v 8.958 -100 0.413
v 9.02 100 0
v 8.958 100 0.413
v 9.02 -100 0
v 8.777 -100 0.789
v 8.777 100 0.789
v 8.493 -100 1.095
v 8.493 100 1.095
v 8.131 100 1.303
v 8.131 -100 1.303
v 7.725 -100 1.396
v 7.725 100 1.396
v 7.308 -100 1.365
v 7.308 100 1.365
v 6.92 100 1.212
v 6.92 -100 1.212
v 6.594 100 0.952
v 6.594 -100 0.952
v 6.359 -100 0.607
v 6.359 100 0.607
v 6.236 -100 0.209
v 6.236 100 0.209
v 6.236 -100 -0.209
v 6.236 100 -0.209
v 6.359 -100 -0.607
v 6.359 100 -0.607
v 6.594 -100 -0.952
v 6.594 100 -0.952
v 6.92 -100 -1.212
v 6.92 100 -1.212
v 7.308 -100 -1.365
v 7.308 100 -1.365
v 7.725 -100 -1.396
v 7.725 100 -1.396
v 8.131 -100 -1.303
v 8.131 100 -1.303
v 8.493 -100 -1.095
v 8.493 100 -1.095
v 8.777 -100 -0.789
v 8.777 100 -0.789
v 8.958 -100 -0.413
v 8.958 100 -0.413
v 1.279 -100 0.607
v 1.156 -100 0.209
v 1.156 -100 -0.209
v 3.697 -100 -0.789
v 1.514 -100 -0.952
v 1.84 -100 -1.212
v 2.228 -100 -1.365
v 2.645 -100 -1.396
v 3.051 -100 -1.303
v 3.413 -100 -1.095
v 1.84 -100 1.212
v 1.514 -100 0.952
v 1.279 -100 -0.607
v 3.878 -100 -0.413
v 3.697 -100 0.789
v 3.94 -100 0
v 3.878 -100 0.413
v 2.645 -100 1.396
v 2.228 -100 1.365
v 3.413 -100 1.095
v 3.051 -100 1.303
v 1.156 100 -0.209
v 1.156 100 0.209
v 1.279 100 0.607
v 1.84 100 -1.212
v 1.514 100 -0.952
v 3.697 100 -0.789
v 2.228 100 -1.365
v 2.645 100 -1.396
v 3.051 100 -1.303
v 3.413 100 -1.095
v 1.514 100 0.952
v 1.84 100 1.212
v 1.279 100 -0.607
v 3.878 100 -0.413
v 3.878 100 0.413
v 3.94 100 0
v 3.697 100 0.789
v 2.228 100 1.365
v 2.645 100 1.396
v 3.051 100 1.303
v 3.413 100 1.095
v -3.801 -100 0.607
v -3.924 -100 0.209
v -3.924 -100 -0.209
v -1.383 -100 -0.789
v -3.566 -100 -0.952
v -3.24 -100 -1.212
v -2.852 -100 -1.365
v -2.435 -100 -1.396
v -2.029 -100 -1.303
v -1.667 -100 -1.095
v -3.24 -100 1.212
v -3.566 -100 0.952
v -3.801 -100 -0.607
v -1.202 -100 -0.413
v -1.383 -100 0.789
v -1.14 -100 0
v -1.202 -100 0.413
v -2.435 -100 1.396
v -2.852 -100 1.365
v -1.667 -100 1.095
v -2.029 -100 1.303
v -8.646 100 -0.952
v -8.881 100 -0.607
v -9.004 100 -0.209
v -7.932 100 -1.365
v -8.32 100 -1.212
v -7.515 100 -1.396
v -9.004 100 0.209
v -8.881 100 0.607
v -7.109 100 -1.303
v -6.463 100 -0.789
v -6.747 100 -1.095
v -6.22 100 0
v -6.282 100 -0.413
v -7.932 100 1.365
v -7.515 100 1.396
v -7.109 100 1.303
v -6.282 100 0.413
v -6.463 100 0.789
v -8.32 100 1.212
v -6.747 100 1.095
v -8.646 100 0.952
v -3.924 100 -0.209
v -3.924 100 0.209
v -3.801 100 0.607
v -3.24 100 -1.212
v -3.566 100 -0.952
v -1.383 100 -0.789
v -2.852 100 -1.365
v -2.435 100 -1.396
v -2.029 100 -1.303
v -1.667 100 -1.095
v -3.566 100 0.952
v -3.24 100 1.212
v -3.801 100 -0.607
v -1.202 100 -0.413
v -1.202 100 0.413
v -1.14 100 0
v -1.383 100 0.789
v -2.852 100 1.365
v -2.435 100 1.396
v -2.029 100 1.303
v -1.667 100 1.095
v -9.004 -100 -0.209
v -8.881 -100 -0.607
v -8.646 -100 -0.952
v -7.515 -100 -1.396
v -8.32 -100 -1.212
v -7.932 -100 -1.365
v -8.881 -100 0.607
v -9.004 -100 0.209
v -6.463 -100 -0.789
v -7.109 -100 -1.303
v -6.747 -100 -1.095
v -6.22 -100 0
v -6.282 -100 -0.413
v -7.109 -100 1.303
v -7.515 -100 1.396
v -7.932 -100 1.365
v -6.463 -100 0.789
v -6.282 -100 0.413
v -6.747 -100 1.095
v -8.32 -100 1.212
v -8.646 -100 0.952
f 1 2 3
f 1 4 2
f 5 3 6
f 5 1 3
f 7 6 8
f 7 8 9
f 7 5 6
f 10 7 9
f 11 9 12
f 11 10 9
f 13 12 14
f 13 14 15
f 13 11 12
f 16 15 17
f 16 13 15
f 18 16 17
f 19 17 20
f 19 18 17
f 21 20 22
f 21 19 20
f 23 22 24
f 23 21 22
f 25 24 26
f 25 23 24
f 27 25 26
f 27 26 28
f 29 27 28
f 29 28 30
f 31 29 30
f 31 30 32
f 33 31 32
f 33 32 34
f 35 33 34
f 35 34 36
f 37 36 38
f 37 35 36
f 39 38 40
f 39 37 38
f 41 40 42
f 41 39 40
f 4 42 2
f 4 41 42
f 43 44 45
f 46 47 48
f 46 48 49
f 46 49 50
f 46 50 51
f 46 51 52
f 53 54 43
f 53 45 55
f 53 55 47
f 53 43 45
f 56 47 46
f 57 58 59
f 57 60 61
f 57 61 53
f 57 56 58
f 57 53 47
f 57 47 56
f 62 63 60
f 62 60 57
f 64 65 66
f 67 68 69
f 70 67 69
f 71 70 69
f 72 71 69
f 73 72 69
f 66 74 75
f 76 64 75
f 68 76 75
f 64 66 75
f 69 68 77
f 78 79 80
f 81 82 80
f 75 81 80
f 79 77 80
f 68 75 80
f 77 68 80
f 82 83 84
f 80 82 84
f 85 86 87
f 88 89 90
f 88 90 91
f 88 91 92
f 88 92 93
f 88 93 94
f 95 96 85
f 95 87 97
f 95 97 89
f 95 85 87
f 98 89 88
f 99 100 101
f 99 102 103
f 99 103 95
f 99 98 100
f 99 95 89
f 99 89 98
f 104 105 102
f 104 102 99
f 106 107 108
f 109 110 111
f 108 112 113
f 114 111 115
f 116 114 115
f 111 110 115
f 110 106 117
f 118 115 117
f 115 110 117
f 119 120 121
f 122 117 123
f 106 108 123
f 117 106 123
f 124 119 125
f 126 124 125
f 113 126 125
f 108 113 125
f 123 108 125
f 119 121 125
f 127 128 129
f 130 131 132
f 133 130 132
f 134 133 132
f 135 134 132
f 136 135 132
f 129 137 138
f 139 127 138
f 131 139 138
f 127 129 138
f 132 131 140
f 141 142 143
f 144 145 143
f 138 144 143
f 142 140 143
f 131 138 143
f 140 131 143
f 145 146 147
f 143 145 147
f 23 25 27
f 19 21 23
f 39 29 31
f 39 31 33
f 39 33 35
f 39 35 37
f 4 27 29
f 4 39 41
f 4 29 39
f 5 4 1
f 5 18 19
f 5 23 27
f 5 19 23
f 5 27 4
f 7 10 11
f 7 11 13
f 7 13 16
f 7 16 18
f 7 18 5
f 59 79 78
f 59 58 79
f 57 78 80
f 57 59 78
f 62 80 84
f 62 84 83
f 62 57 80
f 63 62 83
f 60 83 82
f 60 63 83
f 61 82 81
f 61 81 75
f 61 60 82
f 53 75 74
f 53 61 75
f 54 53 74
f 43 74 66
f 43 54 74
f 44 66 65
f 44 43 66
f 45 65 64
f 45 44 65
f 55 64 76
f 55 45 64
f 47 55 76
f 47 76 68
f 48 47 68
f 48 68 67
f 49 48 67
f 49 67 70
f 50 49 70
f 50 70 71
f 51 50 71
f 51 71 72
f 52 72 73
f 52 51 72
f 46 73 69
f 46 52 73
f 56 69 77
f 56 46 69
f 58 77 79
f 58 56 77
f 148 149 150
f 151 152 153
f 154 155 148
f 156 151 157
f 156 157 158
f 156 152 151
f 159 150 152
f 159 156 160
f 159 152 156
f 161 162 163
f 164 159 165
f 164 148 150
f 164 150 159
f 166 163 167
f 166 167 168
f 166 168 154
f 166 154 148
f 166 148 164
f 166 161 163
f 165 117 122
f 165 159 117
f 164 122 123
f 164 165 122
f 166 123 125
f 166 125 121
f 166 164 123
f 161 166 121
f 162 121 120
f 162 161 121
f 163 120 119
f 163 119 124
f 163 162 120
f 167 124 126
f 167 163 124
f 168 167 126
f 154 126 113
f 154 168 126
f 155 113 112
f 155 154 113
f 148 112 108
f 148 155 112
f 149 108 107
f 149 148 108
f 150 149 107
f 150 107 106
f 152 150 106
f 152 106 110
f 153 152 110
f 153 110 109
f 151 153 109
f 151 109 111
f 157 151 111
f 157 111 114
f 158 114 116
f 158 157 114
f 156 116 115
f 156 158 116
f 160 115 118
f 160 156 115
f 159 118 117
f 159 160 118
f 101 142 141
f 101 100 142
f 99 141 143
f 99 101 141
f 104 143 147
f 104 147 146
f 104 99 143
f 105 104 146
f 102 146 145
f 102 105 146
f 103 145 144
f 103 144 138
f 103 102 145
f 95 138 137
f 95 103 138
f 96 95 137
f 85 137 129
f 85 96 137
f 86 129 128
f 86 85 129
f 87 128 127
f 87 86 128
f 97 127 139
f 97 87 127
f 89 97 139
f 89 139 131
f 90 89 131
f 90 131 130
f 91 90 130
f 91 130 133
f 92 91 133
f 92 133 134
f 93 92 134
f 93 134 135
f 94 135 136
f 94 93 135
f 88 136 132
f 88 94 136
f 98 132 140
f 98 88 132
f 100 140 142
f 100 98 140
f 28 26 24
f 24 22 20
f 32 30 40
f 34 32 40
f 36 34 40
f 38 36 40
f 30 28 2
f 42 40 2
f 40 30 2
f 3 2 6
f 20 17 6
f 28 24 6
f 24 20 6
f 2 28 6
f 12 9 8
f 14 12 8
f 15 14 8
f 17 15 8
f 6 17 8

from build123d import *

# Parameters (mm, degrees)
F0_R     = 1.4
F1_DEPTH = 100


with BuildPart() as f1:
    # F0 (on Front) → F1 (new body, symmetric)
    with BuildSketch(Plane.XZ):
        with Locations((-7.62, 0)):
            Circle(F0_R)
    extrude(amount=F1_DEPTH, both=True)


with BuildPart() as f1b:
    # F0 (on Front) → F1, piece 2 (new body, symmetric)
    with BuildSketch(Plane.XZ):
        with Locations((-2.54, 0)):
            Circle(F0_R)
    extrude(amount=F1_DEPTH, both=True)


with BuildPart() as f1c:
    # F0 (on Front) → F1, piece 3 (new body, symmetric)
    with BuildSketch(Plane.XZ):
        with Locations((2.54, 0)):
            Circle(F0_R)
    extrude(amount=F1_DEPTH, both=True)


with BuildPart() as f1d:
    # F0 (on Front) → F1, piece 4 (new body, symmetric)
    with BuildSketch(Plane.XZ):
        with Locations((7.62, 0)):
            Circle(F0_R)
    extrude(amount=F1_DEPTH, both=True)


solid = Compound([f1.part, f1b.part, f1c.part, f1d.part])
